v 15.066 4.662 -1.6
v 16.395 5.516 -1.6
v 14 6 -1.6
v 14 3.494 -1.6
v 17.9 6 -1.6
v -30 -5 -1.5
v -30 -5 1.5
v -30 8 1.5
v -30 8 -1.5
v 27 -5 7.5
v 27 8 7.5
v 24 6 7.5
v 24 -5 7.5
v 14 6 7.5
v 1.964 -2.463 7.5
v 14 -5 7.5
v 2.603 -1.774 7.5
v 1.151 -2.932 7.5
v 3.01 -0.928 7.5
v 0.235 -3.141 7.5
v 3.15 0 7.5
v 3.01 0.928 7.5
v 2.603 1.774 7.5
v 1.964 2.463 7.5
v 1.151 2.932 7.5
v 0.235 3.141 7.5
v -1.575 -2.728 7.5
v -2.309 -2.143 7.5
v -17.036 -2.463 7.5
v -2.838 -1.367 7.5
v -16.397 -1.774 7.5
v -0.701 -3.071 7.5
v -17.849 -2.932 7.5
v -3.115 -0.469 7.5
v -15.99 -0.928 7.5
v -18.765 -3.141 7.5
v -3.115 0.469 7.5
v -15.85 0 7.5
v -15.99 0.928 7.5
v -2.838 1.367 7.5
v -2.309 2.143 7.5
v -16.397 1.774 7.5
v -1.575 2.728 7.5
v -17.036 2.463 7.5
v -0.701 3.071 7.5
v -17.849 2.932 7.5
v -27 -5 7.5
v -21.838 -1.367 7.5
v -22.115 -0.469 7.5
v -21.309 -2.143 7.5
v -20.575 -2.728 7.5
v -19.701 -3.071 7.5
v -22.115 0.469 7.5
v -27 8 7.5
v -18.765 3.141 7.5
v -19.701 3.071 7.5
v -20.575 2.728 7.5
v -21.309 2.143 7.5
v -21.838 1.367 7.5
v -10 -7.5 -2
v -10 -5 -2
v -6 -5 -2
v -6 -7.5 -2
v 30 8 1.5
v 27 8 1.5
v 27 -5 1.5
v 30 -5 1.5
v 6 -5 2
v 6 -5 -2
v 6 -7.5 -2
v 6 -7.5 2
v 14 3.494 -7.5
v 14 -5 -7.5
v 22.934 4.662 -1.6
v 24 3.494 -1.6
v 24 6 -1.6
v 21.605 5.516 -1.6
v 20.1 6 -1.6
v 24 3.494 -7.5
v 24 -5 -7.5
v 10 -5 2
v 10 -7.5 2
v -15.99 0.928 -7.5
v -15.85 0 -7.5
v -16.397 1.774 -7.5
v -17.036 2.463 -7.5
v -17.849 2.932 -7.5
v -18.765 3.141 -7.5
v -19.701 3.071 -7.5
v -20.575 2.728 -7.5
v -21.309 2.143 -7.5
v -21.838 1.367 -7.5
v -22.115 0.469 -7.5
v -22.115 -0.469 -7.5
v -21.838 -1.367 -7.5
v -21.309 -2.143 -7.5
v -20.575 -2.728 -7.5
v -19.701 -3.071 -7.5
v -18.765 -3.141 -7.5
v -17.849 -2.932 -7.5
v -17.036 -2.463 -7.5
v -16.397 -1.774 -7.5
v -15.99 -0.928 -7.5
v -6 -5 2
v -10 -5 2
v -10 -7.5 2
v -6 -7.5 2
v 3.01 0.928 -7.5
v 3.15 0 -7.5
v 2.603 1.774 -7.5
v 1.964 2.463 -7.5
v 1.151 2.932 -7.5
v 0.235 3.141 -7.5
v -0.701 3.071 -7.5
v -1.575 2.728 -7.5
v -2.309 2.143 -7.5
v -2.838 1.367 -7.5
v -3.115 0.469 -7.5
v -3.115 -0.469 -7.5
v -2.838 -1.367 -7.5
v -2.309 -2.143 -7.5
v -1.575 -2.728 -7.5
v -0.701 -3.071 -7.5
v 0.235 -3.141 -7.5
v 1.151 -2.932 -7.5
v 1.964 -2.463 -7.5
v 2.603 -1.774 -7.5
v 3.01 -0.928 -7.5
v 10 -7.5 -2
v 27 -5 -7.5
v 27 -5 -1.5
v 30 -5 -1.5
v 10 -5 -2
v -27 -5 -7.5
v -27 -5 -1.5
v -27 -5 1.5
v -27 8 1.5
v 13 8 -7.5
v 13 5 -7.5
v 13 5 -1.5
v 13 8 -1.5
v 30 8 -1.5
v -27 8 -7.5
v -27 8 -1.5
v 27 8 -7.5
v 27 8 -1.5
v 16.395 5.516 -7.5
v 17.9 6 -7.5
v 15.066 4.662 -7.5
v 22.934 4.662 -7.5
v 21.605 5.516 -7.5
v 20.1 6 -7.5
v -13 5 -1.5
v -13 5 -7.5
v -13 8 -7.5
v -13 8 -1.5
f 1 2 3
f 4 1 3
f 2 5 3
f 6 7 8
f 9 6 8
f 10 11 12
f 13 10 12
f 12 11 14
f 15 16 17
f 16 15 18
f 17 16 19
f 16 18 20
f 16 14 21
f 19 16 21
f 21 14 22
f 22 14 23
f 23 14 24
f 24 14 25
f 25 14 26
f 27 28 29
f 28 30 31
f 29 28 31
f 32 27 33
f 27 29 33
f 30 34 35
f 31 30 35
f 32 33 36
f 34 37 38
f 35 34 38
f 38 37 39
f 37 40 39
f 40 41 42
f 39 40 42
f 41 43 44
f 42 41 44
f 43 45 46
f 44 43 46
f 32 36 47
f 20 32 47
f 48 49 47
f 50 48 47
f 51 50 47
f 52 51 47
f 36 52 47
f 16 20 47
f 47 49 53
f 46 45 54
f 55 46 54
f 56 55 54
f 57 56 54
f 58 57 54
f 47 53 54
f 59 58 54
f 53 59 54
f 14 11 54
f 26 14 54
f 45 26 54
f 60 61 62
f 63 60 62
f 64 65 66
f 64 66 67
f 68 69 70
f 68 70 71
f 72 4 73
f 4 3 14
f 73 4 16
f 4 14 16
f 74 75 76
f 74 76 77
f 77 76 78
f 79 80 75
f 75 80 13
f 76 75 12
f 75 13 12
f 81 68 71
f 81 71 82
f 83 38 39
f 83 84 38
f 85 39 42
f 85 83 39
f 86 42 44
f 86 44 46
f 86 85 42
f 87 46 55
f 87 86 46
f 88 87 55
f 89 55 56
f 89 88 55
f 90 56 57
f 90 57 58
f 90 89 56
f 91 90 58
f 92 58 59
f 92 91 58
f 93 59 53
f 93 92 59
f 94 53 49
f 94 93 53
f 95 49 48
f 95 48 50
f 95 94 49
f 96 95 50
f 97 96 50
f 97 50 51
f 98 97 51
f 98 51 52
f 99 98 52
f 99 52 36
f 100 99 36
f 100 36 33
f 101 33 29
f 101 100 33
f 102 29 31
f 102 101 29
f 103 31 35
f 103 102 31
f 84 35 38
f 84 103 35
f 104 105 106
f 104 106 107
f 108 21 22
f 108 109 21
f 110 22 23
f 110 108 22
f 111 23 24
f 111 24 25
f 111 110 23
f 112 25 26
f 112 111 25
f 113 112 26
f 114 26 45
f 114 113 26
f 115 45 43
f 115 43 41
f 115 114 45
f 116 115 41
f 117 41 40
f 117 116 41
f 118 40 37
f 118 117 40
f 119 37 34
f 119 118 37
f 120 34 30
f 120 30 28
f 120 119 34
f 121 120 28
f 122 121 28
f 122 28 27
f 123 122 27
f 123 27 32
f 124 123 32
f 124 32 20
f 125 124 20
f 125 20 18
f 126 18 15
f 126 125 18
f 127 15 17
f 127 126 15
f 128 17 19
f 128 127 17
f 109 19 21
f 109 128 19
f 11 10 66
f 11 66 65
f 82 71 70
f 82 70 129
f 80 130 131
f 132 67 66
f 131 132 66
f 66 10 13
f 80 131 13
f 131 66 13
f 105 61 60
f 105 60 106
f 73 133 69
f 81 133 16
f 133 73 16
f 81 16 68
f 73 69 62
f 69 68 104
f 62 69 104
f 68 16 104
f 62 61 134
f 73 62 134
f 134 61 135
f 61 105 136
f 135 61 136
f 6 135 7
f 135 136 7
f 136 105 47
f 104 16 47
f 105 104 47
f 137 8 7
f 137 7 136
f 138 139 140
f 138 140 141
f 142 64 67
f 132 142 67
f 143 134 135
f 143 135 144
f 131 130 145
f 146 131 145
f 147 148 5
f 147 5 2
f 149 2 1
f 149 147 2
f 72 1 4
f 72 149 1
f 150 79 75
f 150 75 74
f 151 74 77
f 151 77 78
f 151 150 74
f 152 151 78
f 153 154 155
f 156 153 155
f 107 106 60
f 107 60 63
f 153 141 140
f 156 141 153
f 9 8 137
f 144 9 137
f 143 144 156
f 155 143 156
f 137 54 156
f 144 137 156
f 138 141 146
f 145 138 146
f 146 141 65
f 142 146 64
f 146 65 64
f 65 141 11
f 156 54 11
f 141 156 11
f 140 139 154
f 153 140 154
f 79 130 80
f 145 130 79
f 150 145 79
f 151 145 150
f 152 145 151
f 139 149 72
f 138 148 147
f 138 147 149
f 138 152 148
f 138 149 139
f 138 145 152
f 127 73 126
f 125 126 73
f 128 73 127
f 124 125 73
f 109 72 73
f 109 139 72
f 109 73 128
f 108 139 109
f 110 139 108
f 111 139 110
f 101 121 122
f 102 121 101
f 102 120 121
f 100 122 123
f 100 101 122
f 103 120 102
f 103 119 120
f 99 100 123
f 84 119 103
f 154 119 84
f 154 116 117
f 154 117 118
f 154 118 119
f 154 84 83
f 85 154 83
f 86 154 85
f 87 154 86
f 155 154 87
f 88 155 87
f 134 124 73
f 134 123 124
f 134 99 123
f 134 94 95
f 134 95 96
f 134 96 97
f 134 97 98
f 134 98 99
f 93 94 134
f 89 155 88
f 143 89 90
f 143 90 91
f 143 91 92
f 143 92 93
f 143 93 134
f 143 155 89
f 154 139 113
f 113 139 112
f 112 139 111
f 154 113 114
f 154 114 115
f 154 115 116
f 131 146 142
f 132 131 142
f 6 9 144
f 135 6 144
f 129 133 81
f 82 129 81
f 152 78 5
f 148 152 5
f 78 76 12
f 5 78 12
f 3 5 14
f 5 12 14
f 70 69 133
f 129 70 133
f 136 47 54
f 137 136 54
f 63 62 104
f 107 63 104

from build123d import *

# Parameters (mm, degrees)
SKETCH1_R           = 3.15
BOSS_EXTRUDE1_DEPTH = 7.5
SKETCH2_W           = 4
SKETCH2_H           = 4
BOSS_EXTRUDE2_DEPTH = 2.5
CUT_EXTRUDE1_START  = -7.5
SKETCH3_W           = 3
SKETCH3_H           = 13
CUT_EXTRUDE1_DEPTH  = 6
SKETCH4_W           = 3
SKETCH4_H           = 13
CUT_EXTRUDE2_DEPTH  = 6
SKETCH5_W           = 26
SKETCH5_H           = 3
CUT_EXTRUDE3_DEPTH  = 6
BOSS_EXTRUDE3_DEPTH = 5.9


with BuildPart() as part:
    # Sketch1 → Boss-Extrude1 (new, symmetric)
    with BuildSketch(Plane.XY):
        Polygon((-30, -5), (-30, 8), (30, 8), (30, -5), (24, -5), (24, 6), (14, 6), (14, -5), align=None)
        with Locations((-19, 0)):
            Circle(SKETCH1_R, mode=Mode.SUBTRACT)
        Circle(SKETCH1_R, mode=Mode.SUBTRACT)
    extrude(amount=BOSS_EXTRUDE1_DEPTH, both=True)

    # Sketch2 → Boss-Extrude2 (add)
    with BuildSketch(Plane.XZ.offset(5)):
        with Locations((8, 0)):
            Rectangle(SKETCH2_W, SKETCH2_H)
        with Locations((-8, 0)):
            Rectangle(SKETCH2_W, SKETCH2_H)
    extrude(amount=BOSS_EXTRUDE2_DEPTH)

    # Sketch3 → Cut-Extrude1 (cut)
    with BuildSketch(Plane.XY.offset(CUT_EXTRUDE1_START)):
        with Locations((-28.5, 1.5)):
            Rectangle(SKETCH3_W, SKETCH3_H)
        with Locations((28.5, 1.5)):
            Rectangle(SKETCH3_W, SKETCH3_H)
    extrude(amount=CUT_EXTRUDE1_DEPTH, mode=Mode.SUBTRACT)

    # Sketch4 → Cut-Extrude2 (cut)
    with BuildSketch(Plane.XY.offset(7.5)):
        with Locations((28.5, 1.5)):
            Rectangle(SKETCH4_W, SKETCH4_H)
        with Locations((-28.5, 1.5)):
            Rectangle(SKETCH4_W, SKETCH4_H)
    extrude(amount=-CUT_EXTRUDE2_DEPTH, mode=Mode.SUBTRACT)

    # Sketch5 → Cut-Extrude3 (cut)
    with BuildSketch(Plane(origin=(0, 0, -7.5), x_dir=(-1, 0, 0), z_dir=(0, 0, -1))):
        with Locations((0, 6.5)):
            Rectangle(SKETCH5_W, SKETCH5_H)
    extrude(amount=-CUT_EXTRUDE3_DEPTH, mode=Mode.SUBTRACT)

    # Sketch6 → Boss-Extrude3 (add)
    with BuildSketch(Plane(origin=(0, 0, -7.5), x_dir=(-1, 0, 0), z_dir=(0, 0, -1))):
        with BuildLine():
            Line((-14, 6), (-17.9, 6))
            ThreePointArc((-17.9, 6), (-15.702704612, 5.132040834), (-14, 3.494281042))
            Line((-14, 3.494281042), (-14, 6))
        make_face()
        with BuildLine():
            Line((-24, 6), (-24, 3.494281042))
            ThreePointArc((-24, 3.494281042), (-22.297295388, 5.132040834), (-20.1, 6))
            Line((-20.1, 6), (-24, 6))
        make_face()
    extrude(amount=-BOSS_EXTRUDE3_DEPTH)


solid = part.part
